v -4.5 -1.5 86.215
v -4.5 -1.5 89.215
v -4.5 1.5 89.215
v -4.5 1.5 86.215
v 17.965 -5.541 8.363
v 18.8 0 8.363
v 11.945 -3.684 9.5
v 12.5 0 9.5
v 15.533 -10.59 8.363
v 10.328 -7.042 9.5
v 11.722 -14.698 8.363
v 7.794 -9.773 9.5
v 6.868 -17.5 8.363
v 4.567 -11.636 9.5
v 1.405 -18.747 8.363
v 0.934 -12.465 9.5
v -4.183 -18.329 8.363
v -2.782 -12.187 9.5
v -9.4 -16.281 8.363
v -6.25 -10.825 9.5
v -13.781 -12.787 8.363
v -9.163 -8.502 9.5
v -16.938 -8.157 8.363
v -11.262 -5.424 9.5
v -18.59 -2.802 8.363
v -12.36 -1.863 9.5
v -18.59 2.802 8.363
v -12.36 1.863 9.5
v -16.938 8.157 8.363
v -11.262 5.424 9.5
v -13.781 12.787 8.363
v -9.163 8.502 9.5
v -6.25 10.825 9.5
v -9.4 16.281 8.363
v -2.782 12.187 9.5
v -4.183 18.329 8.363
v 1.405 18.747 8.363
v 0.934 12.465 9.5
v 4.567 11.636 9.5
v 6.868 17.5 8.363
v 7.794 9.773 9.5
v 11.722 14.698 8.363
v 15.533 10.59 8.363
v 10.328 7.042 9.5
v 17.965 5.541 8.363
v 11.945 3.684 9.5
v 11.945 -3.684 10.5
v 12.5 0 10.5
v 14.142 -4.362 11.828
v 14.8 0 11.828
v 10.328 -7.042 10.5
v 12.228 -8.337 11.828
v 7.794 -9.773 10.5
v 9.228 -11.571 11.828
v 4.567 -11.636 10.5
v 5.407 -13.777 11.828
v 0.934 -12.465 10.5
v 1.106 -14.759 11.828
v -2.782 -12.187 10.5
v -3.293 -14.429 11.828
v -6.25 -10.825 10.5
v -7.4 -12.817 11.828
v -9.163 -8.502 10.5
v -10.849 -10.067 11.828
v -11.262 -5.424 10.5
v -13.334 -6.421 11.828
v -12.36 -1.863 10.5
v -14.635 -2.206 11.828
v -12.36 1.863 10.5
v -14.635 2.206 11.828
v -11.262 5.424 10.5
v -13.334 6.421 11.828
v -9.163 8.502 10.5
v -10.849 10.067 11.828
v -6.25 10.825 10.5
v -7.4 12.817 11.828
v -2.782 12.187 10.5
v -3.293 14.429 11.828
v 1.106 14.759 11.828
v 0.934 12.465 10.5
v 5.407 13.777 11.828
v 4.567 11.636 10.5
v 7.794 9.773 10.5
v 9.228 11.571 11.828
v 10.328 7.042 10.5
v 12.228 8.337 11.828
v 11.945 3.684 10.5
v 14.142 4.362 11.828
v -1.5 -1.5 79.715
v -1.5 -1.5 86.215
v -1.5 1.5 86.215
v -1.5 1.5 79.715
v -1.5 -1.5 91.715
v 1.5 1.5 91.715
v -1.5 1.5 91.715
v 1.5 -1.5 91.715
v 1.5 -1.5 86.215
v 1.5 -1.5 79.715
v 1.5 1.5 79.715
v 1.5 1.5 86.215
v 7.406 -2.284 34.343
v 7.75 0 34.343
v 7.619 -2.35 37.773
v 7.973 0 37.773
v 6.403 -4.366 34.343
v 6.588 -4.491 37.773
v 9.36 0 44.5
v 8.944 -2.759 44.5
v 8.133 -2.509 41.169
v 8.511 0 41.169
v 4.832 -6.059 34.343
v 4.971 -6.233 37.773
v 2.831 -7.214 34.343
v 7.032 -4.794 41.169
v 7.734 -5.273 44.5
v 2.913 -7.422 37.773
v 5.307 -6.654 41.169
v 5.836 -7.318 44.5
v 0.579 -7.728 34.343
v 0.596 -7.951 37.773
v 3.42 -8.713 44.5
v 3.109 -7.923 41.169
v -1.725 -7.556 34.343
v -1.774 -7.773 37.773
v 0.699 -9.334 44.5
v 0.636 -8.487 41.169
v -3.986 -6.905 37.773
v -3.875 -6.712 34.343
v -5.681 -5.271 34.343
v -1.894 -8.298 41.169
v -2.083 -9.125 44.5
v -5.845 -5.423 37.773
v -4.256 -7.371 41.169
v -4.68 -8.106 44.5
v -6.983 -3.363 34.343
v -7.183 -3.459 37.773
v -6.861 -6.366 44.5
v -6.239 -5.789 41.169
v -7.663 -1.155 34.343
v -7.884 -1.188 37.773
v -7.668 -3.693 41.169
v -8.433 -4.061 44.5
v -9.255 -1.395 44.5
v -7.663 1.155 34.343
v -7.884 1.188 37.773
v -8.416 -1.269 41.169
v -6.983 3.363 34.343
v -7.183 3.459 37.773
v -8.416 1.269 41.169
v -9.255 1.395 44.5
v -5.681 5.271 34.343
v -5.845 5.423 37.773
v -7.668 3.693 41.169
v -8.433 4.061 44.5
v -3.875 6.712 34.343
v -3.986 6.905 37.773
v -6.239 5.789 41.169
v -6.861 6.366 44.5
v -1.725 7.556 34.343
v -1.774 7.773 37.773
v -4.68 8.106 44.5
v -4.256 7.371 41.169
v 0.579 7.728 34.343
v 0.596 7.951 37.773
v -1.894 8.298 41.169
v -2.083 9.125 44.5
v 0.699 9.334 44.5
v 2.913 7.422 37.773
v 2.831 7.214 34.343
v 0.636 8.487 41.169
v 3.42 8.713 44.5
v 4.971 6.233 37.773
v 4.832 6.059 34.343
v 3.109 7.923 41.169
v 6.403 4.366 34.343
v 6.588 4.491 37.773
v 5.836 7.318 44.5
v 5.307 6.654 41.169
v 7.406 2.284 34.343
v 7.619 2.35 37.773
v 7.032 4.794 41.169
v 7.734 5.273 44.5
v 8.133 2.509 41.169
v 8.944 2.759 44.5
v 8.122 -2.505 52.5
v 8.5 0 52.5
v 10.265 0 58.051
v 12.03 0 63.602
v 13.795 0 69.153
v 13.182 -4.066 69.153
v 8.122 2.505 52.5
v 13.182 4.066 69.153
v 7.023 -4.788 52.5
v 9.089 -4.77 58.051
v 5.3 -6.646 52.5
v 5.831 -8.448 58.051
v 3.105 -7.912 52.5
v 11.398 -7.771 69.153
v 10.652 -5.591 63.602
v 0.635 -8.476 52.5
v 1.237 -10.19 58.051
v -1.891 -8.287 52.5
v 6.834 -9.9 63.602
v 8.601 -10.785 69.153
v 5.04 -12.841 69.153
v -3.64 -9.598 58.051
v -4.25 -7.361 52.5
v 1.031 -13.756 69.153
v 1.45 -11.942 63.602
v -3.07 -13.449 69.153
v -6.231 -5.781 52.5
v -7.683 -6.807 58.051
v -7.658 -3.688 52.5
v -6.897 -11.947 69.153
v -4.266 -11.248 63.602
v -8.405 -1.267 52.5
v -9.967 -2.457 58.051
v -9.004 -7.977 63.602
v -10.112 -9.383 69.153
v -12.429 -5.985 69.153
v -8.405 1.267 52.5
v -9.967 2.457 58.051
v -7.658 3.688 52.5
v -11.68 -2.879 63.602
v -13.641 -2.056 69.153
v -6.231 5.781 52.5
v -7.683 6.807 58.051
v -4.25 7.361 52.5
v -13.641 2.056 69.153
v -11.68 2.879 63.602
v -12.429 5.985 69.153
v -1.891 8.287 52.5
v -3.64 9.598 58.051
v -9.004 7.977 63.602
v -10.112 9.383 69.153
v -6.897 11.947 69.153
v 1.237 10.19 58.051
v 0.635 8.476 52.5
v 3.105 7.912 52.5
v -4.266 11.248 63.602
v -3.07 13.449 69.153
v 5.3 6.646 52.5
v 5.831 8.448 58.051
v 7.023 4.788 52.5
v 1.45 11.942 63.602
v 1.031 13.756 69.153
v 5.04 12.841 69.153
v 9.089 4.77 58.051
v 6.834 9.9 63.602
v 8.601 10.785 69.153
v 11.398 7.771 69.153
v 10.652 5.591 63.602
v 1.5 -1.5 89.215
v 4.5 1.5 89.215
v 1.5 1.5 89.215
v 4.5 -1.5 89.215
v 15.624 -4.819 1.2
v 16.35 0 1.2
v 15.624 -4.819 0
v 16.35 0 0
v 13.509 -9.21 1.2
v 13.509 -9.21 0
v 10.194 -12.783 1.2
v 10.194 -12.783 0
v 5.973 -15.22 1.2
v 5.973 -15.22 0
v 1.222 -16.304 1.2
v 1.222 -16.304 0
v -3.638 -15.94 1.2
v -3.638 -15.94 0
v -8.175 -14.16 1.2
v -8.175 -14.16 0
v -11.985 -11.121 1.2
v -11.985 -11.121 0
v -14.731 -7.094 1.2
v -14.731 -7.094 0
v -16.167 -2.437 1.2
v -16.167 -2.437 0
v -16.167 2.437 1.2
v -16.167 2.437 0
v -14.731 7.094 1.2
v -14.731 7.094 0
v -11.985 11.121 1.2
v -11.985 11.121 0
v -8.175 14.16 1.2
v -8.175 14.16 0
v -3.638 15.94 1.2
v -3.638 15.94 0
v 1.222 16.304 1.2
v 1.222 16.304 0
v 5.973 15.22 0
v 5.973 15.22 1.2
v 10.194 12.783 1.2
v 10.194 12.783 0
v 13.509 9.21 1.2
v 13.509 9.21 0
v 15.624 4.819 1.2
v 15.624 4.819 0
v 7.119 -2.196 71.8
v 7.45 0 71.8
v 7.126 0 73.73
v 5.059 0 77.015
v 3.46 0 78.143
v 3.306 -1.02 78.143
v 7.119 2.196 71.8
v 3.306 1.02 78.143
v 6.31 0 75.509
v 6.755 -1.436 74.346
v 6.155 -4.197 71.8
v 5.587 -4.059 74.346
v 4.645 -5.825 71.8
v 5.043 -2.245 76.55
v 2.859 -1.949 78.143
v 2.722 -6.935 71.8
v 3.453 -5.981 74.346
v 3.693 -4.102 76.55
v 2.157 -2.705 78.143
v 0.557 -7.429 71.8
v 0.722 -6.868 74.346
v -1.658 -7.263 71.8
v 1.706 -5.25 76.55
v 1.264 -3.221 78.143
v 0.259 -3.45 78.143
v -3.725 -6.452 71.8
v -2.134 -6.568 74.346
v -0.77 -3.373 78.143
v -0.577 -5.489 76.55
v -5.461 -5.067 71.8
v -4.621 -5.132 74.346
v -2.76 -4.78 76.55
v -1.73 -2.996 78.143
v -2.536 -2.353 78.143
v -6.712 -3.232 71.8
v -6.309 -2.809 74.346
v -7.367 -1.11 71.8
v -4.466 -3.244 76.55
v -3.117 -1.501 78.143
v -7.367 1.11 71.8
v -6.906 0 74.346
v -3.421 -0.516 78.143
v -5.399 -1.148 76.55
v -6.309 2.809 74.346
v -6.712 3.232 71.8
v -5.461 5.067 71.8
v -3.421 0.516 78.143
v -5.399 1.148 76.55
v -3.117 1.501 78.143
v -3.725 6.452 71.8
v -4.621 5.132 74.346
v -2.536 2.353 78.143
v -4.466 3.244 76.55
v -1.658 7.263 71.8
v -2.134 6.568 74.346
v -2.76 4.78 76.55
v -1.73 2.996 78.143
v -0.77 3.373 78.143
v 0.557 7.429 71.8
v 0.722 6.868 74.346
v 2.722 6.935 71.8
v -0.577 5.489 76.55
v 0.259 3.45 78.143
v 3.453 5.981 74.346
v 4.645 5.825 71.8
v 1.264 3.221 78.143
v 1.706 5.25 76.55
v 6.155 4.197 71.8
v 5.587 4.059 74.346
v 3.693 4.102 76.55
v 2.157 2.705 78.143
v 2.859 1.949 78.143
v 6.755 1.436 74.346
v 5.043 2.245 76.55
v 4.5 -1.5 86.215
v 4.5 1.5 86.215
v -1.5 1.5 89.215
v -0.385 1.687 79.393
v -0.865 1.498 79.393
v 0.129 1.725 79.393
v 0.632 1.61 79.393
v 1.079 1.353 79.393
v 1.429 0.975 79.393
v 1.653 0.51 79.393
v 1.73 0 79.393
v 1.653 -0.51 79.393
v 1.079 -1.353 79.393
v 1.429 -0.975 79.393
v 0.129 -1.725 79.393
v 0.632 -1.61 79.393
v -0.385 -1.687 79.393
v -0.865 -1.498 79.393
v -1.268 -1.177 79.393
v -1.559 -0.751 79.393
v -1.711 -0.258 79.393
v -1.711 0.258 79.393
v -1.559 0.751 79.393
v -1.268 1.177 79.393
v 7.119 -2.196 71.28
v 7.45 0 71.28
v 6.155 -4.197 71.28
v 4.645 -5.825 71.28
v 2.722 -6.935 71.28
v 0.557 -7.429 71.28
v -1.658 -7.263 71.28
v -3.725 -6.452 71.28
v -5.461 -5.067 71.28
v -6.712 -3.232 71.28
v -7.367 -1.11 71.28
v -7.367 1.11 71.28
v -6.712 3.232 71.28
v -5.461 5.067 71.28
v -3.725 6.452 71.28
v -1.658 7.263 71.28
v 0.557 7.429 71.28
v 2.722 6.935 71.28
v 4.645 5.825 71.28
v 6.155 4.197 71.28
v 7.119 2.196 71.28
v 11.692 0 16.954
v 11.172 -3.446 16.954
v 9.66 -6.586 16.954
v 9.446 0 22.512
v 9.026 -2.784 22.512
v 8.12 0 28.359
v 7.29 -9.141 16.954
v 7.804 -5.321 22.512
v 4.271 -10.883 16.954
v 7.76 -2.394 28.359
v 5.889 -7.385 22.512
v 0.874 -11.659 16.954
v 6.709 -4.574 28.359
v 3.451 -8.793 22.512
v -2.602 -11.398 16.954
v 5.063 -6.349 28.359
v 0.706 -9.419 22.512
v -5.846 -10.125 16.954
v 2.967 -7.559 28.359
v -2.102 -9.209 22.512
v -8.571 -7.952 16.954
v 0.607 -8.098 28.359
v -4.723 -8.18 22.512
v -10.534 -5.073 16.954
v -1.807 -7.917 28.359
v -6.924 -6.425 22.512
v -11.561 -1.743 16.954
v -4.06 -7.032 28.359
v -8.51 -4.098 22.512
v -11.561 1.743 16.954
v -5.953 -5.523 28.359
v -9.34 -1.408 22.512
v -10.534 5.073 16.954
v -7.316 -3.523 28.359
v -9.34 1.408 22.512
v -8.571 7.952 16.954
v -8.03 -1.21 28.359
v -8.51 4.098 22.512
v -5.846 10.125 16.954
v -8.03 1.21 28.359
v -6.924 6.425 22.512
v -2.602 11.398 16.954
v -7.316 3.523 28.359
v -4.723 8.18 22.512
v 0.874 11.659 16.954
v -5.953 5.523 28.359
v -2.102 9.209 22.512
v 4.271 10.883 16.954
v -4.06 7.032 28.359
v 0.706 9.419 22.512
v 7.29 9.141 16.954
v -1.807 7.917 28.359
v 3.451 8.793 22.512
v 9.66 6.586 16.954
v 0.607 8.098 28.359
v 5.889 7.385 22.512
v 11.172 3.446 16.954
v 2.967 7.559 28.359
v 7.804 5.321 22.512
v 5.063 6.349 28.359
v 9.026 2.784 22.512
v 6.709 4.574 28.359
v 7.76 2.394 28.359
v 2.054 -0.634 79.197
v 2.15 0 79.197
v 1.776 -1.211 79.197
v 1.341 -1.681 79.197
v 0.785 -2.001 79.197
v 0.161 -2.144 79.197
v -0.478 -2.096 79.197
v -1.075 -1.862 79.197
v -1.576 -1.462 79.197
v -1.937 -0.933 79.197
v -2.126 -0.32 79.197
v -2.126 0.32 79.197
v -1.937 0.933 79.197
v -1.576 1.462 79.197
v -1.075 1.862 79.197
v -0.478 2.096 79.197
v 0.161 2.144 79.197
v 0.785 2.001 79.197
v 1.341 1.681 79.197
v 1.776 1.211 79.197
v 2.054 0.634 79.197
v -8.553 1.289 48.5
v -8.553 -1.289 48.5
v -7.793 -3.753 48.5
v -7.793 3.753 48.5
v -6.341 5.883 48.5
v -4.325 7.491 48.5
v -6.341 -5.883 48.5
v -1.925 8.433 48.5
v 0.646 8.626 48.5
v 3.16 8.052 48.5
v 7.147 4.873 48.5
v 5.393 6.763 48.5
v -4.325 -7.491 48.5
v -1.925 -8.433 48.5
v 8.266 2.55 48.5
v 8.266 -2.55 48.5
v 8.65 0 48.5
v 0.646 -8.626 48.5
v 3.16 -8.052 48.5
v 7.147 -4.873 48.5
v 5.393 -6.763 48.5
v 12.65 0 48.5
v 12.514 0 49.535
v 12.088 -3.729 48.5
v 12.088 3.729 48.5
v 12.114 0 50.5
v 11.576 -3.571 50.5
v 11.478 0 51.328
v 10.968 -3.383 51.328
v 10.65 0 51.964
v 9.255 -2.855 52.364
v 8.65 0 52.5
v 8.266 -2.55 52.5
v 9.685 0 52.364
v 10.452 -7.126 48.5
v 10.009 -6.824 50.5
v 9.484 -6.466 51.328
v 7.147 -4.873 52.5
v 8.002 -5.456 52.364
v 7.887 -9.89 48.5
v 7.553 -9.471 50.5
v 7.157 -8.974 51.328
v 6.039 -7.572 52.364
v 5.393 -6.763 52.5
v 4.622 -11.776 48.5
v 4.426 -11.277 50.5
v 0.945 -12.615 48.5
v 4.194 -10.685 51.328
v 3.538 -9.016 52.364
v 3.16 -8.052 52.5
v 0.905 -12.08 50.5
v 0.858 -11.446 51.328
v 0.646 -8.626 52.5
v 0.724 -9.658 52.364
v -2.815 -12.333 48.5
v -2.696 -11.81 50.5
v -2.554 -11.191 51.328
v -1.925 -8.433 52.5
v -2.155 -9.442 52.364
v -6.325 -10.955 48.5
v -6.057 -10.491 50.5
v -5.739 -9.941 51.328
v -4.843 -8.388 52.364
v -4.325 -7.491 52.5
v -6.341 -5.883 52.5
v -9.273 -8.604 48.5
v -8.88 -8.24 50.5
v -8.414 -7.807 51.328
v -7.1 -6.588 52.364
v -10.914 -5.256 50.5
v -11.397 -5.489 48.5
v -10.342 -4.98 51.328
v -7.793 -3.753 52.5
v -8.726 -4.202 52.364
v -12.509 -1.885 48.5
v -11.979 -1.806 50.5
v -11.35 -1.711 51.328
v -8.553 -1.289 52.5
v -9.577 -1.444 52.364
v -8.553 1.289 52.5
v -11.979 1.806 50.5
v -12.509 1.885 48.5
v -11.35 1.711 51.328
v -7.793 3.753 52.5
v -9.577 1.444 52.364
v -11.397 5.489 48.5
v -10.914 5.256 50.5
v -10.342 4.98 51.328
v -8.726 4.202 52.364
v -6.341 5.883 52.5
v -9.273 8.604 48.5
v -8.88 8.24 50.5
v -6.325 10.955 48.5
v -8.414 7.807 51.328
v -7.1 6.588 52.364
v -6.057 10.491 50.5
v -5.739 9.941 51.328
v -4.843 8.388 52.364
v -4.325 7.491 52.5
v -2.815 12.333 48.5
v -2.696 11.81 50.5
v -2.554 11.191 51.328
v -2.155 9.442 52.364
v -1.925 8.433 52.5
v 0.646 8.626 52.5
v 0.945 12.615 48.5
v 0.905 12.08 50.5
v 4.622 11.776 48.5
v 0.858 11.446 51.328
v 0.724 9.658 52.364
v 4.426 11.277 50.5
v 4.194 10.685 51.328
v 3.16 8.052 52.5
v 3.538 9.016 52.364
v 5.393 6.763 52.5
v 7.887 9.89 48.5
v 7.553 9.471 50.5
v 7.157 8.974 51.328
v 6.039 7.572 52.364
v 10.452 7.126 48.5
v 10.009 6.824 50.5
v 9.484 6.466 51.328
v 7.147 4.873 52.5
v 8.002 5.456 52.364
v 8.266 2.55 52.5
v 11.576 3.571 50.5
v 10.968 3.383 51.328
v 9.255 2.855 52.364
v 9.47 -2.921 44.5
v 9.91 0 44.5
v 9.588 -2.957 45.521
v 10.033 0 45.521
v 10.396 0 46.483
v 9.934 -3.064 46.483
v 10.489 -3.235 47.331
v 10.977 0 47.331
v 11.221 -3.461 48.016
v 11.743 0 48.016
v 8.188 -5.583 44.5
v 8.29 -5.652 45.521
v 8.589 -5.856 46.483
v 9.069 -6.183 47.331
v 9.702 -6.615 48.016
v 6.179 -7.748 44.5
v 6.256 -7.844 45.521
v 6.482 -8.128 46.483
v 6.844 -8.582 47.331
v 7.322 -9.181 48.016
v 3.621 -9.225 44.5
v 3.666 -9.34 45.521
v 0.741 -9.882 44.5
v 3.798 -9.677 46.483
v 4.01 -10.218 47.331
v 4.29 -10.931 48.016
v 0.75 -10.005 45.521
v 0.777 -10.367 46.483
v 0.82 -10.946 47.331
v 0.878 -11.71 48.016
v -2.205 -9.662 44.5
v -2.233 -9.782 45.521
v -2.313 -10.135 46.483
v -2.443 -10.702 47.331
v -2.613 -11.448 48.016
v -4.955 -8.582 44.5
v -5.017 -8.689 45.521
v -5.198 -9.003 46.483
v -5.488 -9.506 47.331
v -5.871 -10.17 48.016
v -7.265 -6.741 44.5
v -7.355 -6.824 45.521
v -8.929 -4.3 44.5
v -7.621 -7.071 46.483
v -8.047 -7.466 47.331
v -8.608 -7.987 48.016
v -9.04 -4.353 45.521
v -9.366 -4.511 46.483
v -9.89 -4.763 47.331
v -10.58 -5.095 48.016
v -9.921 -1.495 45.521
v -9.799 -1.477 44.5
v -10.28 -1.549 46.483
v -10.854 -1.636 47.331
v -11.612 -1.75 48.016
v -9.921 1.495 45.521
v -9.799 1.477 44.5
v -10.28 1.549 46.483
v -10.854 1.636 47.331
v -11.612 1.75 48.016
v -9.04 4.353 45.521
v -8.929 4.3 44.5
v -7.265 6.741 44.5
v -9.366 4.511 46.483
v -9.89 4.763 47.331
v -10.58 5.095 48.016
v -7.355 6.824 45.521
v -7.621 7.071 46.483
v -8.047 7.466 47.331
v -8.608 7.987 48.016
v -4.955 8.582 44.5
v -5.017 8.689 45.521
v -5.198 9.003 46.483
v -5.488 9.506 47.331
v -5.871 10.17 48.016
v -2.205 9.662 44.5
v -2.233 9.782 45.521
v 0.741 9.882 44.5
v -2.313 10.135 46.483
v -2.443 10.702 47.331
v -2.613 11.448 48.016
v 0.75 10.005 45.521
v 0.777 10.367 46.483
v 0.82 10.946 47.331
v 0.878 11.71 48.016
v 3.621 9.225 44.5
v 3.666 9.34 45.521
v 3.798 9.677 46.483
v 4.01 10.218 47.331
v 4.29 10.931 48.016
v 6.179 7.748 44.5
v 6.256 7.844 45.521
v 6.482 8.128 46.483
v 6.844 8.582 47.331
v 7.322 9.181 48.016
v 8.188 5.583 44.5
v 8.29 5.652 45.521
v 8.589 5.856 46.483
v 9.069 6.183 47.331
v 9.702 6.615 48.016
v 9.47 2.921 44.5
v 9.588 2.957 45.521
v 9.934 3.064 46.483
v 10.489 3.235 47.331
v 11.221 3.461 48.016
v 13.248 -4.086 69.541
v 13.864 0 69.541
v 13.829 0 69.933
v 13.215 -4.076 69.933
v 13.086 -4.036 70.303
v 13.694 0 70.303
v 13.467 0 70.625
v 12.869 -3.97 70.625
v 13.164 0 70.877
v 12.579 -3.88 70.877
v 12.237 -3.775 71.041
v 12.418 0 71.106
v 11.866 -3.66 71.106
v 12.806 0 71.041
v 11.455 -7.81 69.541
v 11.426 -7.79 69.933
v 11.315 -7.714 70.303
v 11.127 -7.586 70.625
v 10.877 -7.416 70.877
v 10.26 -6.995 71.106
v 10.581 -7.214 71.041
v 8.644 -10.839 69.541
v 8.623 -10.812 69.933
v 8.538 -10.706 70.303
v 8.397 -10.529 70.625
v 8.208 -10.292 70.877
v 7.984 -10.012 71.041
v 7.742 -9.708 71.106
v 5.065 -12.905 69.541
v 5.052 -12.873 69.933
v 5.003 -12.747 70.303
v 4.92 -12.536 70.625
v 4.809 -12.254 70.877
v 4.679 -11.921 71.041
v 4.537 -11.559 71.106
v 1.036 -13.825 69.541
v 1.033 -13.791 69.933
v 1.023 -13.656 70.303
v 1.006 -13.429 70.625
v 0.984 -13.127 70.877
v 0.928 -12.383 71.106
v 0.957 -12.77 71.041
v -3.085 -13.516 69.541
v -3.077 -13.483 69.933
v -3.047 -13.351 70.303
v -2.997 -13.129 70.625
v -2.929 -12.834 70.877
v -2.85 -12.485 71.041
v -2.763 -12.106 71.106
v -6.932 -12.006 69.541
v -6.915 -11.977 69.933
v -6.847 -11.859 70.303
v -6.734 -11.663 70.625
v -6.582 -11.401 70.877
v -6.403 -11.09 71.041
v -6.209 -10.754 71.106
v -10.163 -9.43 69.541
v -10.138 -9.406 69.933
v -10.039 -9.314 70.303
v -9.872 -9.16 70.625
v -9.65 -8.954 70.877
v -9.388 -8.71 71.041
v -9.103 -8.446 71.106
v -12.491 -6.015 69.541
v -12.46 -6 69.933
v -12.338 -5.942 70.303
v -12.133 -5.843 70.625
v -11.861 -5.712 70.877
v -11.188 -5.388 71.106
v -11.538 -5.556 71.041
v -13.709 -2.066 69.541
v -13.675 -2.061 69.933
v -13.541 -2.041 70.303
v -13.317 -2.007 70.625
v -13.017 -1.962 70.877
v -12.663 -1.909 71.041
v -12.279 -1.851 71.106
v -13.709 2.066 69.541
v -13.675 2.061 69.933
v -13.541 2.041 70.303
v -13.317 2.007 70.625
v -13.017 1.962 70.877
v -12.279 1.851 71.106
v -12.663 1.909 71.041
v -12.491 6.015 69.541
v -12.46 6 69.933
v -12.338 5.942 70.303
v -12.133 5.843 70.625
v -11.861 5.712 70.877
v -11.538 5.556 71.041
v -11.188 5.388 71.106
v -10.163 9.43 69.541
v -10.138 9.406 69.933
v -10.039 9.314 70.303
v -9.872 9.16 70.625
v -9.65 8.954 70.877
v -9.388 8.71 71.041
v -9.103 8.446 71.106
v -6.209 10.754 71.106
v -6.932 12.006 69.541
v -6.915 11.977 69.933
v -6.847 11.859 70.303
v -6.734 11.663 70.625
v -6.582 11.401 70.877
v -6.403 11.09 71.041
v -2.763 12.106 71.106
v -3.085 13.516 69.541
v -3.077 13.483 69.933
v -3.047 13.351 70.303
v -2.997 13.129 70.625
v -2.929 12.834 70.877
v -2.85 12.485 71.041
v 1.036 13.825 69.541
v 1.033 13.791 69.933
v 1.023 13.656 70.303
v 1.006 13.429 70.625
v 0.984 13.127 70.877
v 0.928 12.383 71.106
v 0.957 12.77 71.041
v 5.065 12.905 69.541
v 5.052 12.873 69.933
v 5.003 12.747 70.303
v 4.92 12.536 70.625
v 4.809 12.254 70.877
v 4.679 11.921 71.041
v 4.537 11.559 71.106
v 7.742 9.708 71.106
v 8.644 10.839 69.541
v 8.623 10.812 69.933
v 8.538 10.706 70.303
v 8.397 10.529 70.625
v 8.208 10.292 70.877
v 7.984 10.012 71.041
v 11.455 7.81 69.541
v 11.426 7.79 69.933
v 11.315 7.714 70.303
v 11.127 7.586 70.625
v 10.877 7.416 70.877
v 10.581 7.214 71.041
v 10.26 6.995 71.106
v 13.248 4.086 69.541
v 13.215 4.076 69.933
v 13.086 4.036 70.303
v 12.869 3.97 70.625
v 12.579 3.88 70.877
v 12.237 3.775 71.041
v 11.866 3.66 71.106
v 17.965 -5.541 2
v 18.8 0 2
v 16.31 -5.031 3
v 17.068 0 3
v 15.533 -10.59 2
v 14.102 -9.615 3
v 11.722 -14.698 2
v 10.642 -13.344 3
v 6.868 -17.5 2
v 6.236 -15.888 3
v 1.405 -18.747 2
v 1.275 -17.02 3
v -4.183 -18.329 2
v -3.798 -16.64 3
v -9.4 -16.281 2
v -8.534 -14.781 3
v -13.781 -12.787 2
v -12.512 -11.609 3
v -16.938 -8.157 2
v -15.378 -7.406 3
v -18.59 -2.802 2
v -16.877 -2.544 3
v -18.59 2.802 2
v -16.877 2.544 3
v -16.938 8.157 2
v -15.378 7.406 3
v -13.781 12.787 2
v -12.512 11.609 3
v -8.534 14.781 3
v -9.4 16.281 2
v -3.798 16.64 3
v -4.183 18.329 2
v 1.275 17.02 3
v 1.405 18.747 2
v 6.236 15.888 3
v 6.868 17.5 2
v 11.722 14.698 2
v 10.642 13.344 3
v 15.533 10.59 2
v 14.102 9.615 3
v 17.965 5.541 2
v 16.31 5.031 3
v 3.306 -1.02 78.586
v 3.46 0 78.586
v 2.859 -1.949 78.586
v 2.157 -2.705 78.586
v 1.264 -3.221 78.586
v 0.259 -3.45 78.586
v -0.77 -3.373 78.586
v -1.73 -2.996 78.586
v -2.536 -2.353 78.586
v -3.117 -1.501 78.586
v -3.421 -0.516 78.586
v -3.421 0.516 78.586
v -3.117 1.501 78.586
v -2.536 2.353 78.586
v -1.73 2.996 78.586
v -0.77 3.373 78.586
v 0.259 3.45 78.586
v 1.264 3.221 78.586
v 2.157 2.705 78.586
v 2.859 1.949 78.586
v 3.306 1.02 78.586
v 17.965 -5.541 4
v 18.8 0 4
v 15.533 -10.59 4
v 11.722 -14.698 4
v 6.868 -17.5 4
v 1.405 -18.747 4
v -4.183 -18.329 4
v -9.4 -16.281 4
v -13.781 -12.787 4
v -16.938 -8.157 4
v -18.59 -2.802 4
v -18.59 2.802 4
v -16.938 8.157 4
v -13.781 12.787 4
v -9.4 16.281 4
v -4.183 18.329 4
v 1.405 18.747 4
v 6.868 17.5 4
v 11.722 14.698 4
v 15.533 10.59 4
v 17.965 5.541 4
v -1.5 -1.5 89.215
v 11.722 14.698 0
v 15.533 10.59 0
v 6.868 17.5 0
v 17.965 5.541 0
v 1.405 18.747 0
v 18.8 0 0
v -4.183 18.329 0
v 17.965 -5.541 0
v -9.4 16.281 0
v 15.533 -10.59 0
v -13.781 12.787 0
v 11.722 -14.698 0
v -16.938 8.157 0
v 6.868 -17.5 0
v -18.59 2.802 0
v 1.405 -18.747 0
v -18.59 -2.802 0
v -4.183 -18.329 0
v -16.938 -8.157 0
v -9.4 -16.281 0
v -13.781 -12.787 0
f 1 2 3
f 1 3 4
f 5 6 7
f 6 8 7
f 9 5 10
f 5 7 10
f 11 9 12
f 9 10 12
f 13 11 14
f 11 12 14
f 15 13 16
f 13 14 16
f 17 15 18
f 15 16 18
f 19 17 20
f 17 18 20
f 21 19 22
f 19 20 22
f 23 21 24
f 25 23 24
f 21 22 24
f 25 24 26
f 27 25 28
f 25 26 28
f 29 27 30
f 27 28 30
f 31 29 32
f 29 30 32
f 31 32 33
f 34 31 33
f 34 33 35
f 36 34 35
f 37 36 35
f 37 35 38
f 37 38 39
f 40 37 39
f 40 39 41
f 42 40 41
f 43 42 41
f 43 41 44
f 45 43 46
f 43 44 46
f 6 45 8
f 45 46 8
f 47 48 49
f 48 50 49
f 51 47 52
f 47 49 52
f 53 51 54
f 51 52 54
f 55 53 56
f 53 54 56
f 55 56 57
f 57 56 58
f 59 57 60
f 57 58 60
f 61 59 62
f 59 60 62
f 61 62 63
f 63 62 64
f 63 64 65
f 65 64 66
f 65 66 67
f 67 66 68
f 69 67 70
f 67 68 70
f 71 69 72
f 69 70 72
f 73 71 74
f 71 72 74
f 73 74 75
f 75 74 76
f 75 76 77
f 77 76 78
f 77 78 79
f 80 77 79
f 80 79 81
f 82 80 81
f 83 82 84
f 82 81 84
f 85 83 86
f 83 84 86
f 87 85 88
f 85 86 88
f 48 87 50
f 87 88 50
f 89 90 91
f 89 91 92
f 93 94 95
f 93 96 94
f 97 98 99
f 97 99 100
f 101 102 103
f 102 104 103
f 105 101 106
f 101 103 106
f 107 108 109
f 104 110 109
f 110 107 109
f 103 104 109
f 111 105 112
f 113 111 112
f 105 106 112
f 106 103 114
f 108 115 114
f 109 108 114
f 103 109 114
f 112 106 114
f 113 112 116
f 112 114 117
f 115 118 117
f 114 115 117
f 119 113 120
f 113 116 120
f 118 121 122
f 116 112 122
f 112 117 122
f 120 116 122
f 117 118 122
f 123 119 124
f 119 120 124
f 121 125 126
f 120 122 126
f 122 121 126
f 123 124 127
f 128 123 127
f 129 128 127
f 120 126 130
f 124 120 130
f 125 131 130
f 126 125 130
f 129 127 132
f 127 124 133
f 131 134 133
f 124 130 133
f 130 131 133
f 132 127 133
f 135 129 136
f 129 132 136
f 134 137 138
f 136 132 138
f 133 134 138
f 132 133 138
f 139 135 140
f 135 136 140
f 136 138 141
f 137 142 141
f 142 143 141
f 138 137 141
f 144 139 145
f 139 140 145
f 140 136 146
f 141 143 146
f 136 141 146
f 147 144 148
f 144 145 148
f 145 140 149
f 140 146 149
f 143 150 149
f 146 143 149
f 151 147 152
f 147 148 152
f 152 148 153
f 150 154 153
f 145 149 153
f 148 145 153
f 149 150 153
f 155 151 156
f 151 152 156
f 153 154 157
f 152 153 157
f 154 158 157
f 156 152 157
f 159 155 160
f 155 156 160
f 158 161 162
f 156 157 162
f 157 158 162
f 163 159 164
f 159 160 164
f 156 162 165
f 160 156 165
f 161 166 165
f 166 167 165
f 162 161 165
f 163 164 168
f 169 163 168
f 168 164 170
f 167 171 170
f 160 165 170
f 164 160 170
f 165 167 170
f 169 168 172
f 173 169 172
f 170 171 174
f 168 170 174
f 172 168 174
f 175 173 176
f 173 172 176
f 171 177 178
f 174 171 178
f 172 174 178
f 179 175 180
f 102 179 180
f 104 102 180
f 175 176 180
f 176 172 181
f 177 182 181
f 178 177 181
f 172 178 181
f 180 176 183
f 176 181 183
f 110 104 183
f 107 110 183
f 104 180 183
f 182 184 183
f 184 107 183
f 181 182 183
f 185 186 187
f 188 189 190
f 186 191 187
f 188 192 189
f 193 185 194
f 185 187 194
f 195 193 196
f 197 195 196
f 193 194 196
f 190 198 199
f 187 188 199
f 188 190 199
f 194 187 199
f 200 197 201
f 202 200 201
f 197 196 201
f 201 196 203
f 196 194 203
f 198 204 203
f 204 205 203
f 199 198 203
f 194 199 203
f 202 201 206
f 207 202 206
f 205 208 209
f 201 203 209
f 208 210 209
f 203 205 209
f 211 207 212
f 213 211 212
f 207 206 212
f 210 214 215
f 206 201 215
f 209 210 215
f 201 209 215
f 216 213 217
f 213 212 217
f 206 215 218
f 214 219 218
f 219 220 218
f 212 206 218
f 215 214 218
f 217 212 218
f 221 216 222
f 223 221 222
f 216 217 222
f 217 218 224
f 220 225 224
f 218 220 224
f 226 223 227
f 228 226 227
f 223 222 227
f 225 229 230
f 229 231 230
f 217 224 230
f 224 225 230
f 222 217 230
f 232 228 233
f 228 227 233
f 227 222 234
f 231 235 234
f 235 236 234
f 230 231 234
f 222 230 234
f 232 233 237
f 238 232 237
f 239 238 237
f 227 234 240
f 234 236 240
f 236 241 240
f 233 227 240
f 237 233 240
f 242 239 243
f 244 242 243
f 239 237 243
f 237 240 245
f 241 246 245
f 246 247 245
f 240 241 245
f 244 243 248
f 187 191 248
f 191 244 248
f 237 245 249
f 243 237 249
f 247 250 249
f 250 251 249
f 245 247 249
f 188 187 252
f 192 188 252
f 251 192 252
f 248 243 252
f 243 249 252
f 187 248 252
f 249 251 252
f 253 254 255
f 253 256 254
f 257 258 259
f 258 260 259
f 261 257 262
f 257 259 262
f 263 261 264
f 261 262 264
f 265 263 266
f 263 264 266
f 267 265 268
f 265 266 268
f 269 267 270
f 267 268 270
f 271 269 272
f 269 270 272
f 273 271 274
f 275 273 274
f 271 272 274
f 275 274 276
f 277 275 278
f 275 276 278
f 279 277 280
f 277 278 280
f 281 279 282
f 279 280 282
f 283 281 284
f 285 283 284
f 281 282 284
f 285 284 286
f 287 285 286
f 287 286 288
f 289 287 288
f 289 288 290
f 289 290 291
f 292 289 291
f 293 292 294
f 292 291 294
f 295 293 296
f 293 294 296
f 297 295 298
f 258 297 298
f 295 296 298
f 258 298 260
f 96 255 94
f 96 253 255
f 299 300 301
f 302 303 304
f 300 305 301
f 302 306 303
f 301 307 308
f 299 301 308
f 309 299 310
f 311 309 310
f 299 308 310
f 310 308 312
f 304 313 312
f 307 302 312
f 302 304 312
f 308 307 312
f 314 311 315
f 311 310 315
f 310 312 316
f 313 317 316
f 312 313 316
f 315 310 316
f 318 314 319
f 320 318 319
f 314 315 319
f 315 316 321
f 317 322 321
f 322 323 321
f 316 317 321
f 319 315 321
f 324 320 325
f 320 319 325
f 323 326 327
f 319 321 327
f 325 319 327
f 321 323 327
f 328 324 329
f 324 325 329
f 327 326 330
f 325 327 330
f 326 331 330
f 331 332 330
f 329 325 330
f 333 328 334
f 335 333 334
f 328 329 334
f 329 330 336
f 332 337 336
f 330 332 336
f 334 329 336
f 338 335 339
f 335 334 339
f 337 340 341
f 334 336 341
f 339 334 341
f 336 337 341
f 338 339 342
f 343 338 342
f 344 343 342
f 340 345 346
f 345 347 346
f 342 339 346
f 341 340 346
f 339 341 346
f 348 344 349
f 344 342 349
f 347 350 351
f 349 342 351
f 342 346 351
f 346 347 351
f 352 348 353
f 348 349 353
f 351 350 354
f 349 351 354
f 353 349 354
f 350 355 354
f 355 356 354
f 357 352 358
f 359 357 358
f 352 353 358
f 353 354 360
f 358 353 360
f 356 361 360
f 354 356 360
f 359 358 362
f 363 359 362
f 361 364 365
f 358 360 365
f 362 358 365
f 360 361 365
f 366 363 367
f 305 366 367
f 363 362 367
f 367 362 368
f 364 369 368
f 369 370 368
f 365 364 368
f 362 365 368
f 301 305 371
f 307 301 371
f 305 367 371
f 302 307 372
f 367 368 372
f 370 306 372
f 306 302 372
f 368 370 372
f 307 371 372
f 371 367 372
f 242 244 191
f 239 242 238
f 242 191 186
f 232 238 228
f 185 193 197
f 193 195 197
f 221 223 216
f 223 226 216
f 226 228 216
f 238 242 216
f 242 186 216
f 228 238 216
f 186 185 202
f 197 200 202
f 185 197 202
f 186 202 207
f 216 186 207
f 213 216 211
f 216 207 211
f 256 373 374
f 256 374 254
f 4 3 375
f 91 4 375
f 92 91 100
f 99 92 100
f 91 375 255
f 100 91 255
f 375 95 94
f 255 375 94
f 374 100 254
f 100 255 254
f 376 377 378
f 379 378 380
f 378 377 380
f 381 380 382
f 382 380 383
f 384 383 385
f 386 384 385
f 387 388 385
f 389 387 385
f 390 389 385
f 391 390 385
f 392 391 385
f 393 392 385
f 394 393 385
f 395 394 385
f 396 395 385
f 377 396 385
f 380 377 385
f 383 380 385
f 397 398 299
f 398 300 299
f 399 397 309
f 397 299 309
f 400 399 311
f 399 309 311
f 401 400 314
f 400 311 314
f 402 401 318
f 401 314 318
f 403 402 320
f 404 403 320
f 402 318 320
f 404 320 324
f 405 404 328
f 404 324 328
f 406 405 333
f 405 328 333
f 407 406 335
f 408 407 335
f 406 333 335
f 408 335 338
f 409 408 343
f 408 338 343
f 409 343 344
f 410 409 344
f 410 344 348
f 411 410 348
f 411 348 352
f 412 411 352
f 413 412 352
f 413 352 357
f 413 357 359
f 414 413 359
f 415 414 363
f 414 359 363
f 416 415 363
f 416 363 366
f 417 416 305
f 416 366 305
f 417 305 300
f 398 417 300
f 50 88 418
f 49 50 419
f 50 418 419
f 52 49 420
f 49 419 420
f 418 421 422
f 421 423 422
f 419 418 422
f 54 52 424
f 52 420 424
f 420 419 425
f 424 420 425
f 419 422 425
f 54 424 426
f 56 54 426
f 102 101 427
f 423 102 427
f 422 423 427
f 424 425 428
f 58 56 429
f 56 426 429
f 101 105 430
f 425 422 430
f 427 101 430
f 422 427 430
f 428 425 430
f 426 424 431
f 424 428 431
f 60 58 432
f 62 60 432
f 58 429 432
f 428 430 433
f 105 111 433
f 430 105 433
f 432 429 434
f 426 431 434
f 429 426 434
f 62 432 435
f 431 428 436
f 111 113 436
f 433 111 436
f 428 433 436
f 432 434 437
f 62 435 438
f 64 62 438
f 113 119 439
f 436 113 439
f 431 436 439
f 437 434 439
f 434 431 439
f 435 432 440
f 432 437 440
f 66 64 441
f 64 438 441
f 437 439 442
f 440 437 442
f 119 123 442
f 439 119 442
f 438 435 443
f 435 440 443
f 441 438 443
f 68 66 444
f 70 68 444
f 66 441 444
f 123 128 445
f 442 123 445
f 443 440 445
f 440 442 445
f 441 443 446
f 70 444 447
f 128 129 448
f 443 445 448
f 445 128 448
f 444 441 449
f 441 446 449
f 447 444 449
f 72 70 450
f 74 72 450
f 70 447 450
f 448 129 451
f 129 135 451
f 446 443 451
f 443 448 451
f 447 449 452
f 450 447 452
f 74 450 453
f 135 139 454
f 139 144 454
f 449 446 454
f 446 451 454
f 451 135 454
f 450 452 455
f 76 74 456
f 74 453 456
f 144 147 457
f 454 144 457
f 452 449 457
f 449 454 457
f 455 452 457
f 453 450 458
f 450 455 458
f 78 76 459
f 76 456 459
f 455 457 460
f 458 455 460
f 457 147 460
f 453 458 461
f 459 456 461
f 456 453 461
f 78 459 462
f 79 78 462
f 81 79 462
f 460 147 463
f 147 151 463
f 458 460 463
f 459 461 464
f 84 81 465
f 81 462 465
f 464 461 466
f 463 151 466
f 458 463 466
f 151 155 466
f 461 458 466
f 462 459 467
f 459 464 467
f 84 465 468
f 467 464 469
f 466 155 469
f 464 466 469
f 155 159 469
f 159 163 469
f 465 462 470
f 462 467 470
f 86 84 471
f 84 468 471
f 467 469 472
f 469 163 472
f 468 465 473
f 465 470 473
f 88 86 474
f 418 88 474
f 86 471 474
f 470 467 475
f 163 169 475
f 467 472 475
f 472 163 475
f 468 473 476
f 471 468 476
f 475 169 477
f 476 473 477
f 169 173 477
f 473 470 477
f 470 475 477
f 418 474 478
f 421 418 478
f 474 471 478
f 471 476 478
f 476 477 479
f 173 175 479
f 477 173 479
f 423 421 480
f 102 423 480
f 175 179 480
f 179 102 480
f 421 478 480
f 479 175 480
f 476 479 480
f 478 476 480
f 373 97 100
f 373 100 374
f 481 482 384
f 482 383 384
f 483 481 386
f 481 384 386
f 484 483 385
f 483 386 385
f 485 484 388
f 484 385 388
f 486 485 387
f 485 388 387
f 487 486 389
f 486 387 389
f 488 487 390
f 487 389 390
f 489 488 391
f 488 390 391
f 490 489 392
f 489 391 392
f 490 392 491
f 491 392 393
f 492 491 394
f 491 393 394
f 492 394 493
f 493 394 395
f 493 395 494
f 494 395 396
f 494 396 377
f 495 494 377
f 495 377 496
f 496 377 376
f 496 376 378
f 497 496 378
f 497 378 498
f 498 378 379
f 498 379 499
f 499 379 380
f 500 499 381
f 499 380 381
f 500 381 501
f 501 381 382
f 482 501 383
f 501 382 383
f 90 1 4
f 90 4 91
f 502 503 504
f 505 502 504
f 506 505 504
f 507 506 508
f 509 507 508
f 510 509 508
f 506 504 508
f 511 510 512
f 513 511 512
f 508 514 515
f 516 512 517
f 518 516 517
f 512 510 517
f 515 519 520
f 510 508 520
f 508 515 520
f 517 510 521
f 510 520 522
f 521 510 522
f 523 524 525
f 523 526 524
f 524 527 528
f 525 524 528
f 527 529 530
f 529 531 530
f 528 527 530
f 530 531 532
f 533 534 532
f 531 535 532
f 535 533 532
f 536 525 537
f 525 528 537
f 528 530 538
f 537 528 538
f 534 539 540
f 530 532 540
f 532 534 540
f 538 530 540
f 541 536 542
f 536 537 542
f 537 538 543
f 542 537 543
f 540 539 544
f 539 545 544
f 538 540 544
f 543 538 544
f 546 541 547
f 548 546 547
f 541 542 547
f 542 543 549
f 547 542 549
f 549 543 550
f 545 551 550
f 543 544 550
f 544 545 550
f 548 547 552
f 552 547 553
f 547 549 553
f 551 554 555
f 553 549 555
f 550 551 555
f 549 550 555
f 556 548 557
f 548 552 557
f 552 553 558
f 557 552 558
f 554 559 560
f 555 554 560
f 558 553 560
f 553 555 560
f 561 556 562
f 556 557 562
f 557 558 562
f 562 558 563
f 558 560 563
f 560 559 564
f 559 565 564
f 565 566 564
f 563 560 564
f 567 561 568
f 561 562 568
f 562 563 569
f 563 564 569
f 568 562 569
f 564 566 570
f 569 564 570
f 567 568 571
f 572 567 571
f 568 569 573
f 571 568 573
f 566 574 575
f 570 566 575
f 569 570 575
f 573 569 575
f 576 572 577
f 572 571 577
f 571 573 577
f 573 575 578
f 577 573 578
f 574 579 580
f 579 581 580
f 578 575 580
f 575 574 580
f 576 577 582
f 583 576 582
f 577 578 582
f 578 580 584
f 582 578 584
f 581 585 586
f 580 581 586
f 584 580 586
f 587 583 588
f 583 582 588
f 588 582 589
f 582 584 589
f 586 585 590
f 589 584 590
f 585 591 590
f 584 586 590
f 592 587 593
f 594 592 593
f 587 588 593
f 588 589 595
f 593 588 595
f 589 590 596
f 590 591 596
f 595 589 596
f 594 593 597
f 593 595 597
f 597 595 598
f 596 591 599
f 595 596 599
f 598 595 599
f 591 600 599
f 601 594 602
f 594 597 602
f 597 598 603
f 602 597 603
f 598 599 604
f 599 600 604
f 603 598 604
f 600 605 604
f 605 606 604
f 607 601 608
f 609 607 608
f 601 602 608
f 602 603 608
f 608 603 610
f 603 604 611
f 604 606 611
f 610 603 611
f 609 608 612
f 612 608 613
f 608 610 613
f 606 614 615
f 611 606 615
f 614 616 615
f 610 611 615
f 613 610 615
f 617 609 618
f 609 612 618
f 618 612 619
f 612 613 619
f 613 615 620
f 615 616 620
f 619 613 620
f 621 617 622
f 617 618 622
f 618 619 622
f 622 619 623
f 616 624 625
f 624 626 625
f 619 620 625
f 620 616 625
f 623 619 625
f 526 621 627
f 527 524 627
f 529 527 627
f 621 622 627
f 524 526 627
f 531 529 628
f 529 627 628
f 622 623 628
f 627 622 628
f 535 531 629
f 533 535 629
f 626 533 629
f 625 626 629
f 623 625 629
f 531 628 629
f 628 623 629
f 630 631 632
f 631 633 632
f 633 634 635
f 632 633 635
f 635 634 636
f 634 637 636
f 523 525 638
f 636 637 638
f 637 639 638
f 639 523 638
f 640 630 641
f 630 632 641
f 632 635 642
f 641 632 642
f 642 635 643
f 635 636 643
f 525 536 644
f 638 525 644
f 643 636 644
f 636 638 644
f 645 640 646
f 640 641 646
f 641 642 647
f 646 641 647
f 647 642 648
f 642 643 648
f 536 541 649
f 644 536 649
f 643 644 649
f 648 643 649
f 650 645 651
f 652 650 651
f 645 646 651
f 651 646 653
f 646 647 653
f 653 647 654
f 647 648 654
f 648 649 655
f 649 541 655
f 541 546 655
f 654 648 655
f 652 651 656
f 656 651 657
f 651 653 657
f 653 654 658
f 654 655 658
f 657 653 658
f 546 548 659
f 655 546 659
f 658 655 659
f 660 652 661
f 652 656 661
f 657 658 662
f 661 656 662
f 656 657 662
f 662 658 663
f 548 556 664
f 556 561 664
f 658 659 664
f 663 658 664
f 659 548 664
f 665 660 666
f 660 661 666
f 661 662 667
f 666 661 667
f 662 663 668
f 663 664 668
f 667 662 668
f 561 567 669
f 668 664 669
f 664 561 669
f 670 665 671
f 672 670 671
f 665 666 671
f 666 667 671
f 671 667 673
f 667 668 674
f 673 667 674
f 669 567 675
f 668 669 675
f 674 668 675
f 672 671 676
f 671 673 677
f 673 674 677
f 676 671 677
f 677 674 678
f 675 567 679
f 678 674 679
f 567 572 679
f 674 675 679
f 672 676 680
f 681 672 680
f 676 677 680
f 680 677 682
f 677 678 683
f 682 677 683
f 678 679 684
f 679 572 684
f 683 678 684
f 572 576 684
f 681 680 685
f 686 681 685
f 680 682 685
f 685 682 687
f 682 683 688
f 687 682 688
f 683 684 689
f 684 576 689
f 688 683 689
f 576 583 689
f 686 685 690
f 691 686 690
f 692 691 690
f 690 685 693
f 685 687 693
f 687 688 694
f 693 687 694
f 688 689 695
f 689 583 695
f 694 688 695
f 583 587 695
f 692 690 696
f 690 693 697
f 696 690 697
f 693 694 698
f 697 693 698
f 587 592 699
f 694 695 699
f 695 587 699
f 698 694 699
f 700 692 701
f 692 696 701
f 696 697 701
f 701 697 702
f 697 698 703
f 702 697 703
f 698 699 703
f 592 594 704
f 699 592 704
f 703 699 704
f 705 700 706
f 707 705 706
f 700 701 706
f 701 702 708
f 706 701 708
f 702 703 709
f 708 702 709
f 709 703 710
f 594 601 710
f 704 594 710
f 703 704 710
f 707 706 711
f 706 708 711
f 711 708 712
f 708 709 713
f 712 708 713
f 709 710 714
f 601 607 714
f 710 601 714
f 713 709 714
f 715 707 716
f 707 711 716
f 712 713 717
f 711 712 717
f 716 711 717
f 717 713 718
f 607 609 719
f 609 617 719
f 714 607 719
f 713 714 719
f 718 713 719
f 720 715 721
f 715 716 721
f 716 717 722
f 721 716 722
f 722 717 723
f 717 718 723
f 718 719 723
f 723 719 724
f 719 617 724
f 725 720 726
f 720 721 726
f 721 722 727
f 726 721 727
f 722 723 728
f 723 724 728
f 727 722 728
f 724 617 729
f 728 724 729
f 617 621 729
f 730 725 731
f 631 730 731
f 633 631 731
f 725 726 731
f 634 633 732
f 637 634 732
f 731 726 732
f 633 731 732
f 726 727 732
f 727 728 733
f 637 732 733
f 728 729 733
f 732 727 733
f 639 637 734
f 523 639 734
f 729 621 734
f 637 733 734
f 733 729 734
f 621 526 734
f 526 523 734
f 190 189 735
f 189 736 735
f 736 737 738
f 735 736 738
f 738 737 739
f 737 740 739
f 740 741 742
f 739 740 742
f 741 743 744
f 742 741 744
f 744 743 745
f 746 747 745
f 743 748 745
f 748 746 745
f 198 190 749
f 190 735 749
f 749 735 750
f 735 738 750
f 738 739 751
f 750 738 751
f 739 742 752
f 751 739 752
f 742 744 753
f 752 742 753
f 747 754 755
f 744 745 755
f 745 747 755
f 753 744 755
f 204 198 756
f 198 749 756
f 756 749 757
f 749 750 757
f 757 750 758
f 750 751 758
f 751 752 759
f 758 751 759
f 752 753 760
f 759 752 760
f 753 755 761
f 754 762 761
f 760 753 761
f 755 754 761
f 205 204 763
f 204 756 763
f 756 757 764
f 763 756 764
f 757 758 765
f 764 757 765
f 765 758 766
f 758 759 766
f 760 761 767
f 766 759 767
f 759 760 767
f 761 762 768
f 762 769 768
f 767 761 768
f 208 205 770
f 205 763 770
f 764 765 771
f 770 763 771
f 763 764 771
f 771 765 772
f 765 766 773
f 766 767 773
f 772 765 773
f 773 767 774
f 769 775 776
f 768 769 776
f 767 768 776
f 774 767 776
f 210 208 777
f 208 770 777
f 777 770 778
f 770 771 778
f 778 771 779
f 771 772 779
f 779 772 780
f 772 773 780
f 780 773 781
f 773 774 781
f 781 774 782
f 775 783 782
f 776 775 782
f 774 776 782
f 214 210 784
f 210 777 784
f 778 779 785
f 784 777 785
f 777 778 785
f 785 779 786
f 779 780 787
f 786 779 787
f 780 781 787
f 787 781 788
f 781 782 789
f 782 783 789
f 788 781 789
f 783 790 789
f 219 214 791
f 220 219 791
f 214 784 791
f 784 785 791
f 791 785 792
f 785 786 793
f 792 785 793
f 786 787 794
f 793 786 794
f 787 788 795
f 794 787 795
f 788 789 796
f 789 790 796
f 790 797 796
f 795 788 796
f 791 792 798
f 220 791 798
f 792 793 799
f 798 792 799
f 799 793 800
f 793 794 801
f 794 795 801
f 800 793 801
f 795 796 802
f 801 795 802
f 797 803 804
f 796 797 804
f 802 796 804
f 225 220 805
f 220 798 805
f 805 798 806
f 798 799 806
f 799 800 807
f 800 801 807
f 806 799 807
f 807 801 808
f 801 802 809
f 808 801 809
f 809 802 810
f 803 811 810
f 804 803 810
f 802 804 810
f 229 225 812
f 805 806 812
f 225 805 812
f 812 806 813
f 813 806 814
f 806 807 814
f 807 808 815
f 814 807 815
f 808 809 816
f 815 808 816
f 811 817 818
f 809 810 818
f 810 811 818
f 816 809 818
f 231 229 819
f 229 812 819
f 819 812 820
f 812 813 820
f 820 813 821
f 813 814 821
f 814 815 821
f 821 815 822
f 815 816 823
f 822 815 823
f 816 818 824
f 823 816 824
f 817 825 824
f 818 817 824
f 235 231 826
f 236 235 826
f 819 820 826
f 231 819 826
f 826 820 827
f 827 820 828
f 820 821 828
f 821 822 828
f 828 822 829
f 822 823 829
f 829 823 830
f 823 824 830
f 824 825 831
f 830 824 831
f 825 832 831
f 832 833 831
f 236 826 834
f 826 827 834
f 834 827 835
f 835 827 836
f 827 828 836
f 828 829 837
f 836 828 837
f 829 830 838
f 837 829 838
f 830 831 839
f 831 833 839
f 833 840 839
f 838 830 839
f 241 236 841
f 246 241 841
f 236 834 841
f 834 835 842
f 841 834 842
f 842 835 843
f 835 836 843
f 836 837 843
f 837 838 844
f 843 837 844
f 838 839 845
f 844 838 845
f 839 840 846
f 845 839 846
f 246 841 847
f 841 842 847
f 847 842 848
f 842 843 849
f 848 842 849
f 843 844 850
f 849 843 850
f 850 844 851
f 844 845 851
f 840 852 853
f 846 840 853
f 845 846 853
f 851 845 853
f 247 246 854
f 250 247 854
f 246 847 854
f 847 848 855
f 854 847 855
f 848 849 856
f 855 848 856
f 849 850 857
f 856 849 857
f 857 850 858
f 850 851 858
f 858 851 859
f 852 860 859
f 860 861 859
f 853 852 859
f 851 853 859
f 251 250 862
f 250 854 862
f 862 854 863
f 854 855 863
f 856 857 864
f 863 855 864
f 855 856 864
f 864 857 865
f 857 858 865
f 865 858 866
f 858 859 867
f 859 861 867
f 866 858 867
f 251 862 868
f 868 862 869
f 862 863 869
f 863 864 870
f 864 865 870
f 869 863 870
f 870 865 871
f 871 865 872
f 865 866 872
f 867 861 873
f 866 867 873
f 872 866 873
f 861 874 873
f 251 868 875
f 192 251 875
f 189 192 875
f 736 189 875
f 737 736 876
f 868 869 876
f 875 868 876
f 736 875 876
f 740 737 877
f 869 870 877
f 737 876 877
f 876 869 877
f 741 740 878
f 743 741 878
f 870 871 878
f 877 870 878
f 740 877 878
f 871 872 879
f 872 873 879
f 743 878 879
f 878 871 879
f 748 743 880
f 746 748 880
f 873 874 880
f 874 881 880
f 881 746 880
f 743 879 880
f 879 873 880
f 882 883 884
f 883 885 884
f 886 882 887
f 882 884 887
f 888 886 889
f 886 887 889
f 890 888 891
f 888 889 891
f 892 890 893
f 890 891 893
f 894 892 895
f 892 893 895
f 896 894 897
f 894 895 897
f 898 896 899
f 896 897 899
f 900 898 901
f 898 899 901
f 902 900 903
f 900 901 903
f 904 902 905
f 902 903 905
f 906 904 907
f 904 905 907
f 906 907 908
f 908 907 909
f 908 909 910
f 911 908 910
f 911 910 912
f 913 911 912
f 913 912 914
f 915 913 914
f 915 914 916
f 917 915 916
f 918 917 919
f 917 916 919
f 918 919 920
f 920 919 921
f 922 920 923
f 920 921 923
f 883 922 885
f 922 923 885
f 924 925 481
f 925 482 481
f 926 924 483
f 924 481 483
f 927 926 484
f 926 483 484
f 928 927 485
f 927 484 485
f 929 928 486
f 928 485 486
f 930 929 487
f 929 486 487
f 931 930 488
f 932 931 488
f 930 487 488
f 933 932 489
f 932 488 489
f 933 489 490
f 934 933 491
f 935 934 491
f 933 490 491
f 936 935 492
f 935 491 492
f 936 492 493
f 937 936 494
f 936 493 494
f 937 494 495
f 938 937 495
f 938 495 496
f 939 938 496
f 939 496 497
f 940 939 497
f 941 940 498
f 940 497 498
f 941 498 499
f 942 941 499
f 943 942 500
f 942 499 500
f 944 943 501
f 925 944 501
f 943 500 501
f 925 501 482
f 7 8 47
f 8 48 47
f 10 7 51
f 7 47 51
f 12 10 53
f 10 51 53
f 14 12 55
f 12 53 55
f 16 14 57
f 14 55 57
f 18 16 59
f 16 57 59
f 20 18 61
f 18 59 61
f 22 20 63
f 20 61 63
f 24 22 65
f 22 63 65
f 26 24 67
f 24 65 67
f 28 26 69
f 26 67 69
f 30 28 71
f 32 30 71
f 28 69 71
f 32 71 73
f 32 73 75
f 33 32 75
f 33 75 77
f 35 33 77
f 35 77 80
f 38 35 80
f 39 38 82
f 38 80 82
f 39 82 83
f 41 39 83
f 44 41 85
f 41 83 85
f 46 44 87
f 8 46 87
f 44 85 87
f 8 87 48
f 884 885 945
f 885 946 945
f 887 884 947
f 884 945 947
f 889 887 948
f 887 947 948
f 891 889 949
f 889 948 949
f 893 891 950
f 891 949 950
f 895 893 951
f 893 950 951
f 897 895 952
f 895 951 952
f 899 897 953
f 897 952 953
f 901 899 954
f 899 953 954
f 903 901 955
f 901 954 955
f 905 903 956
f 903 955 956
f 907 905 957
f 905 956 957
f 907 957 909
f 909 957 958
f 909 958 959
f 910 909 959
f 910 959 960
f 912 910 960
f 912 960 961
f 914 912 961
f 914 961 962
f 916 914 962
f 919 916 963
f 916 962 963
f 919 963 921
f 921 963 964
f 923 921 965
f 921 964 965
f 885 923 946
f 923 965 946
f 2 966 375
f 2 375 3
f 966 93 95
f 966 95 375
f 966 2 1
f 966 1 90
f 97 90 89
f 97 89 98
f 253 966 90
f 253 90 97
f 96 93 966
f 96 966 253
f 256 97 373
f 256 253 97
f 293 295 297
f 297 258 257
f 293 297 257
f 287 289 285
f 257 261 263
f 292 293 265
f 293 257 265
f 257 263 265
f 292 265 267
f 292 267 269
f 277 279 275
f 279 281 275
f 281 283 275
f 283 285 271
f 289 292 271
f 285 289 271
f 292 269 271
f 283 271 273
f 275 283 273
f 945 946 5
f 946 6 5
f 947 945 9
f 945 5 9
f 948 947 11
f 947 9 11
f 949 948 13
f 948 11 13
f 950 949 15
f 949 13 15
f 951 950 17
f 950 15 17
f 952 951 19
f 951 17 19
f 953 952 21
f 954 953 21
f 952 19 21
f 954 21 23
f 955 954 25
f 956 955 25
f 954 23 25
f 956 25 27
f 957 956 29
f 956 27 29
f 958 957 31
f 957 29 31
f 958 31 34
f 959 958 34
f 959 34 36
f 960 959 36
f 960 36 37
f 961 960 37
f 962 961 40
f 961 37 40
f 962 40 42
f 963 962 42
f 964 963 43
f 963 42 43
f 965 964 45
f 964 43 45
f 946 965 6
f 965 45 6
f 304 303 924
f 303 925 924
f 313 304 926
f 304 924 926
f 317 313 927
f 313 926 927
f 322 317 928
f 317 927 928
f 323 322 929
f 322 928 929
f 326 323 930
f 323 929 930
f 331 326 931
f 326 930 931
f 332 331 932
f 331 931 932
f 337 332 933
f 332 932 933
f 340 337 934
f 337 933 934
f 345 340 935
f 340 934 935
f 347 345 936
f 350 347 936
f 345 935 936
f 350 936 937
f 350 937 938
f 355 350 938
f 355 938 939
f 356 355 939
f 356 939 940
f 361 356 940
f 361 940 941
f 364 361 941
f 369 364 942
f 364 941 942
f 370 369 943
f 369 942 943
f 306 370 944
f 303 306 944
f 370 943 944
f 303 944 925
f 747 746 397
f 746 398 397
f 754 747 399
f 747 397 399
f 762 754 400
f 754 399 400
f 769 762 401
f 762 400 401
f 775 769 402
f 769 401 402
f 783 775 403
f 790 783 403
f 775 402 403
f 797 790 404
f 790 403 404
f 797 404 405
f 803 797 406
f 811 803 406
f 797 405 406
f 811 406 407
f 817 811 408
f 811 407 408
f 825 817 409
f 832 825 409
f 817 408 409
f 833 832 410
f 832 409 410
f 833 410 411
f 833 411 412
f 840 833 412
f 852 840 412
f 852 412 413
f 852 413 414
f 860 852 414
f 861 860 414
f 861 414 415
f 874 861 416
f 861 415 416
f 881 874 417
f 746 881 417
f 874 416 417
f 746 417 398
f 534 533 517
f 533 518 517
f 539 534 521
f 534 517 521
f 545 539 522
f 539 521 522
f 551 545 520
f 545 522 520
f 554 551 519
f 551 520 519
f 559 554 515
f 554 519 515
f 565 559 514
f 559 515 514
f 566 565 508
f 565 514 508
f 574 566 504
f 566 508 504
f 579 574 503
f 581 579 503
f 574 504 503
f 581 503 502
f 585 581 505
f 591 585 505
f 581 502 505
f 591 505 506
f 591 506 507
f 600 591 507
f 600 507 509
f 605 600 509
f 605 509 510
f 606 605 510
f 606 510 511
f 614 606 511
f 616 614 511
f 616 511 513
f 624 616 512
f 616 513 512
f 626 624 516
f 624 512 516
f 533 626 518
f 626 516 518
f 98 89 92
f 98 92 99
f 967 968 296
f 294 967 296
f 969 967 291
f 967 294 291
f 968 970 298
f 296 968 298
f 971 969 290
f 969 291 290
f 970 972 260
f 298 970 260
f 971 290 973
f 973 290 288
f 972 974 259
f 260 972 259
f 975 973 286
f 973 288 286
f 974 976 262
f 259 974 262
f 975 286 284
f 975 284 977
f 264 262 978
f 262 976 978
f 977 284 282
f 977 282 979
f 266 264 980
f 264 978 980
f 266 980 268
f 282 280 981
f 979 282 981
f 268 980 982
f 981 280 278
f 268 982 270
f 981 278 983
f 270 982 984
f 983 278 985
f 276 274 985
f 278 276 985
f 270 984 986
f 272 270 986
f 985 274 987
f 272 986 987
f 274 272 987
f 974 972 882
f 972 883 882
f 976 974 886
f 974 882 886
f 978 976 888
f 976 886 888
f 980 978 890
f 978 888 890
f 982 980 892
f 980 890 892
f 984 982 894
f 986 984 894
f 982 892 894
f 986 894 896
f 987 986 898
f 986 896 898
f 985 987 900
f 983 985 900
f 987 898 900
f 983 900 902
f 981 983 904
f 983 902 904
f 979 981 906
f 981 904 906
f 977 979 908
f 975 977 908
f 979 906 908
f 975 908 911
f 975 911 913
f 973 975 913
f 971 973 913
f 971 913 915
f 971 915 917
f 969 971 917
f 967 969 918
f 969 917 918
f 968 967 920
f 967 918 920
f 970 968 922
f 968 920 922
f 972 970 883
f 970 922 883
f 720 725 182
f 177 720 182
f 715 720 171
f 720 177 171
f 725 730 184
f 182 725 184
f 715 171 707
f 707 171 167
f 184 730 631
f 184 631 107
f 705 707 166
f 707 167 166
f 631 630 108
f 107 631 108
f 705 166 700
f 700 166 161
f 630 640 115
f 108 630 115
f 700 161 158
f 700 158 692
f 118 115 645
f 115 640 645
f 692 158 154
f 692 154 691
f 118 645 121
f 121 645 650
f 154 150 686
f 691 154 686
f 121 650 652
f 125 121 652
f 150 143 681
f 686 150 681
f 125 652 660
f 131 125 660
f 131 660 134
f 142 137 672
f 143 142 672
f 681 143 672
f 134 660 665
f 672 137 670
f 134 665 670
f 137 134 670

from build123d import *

# Parameters (mm, degrees)
F0_W     = 12.5
F0_H     = 1
F3_DEPTH = 1.5


# Not quite as in the source:
# - a feature names something its author has since deleted; it is built from what else it names


with BuildPart() as f1:
    # F0 (on Front) → F1 (revolve)
    with BuildSketch(Plane.XZ):
        Polygon((18.8, 0), (18.8, 2.0002274268), (17.0679491924, 3.0002274268), (18.8, 4.0002274268), (18.8, 8.3626933041), (12.5, 9.5), (0, 9.5), (0, 1.2), (16.35, 1.2), (16.35, 0), align=None)
        with Locations((6.25, 10)):
            Rectangle(F0_W, F0_H)
        with BuildLine():
            Line((0, 34.3426428735), (7.75, 34.3426428735))
            ThreePointArc((7.75, 34.3426428735), (8.2028205644, 39.4771439193), (9.36, 44.5))
            Line((9.36, 44.5), (0, 44.5))
            Line((0, 44.5), (0, 34.3426428735))
        make_face()
        with BuildLine():
            Line((0, 44.5), (9.36, 44.5))
            Line((9.36, 44.5), (9.9101864842, 44.5))
            ThreePointArc((9.9101864842, 44.5), (10.6608114666, 46.9241791446), (12.65, 48.5))
            Line((12.65, 48.5), (8.65, 48.5))
            Line((8.65, 48.5), (0, 48.5))
            Line((0, 48.5), (0, 44.5))
        make_face()
        with BuildLine():
            Line((8.65, 48.5), (12.65, 48.5))
            ThreePointArc((12.65, 48.5), (11.4784271247, 51.3284271247), (8.65, 52.5))
            Line((8.65, 52.5), (8.65, 48.5))
        make_face()
        with BuildLine():
            Line((0, 10.5), (12.5, 10.5))
            Line((12.5, 10.5), (14.8, 11.8279056191))
            ThreePointArc((14.8, 11.8279056191), (9.4456568695, 22.5124552556), (7.75, 34.3426428735))
            Line((7.75, 34.3426428735), (0, 34.3426428735))
            Line((0, 34.3426428735), (0, 10.5))
        make_face()
    revolve(axis=Axis((0, 0, 39.4972705525), (0, 0, -1)))


with BuildPart() as f1b:
    # F0 (on Front) → F1, piece 2 (revolve)
    with BuildSketch(Plane.XZ):
        with BuildLine():
            Line((0, 64.2382279038), (0, 52.5))
            Line((0, 52.5), (8.5, 52.5))
            Line((8.5, 52.5), (13.7947297094, 69.1527789248))
            ThreePointArc((13.7947297094, 69.1527789248), (13.5912487708, 70.4715238313), (12.417594041, 71.1063680609))
            Line((12.417594041, 71.1063680609), (7.45, 71.2798402673))
            Line((7.45, 71.2798402673), (7.45, 64.2382279038))
            Line((7.45, 64.2382279038), (0, 64.2382279038))
        make_face()
        with BuildLine():
            Line((0, 78.1429223141), (0, 64.2382279038))
            Line((0, 64.2382279038), (7.45, 64.2382279038))
            Line((7.45, 64.2382279038), (7.45, 71.2798402673))
            Line((7.45, 71.2798402673), (7.45, 71.8001597327))
            ThreePointArc((7.45, 71.8001597327), (6.3098878192, 75.5093196892), (3.46, 78.1429223141))
            Line((3.46, 78.1429223141), (2.15, 78.1429223141))
            Line((2.15, 78.1429223141), (0, 78.1429223141))
        make_face()
        Polygon((0, 78.994541105), (0, 78.1429223141), (2.15, 78.1429223141), (2.15, 79.1970730977), (1.73, 79.3929223141), (0, 79.3929223141), align=None)
        Polygon((2.15, 79.1970730977), (2.15, 78.1429223141), (3.46, 78.1429223141), (3.46, 78.5862100655), align=None)
    revolve(axis=Axis((0, 0, 39.4972705525), (0, 0, -1)))


with BuildPart() as f3:
    # F2 (on Front) → F3 (new body, symmetric)
    with BuildSketch(Plane.XZ):
        Polygon((1.5, 91.7148197889), (0, 91.7148197889), (-1.5, 91.7148197889), (-1.5, 89.2148197889), (-4.5, 89.2148197889), (-4.5, 86.2148197889), (-1.5, 86.2148197889), (-1.5, 79.7148197889), (0, 79.7148197889), (1.5, 79.7148197889), (1.5, 86.2148197889), (4.5, 86.2148197889), (4.5, 89.2148197889), (1.5, 89.2148197889), align=None)
    extrude(amount=F3_DEPTH, both=True)


solid = Compound([f1.part, f1b.part, f3.part])
